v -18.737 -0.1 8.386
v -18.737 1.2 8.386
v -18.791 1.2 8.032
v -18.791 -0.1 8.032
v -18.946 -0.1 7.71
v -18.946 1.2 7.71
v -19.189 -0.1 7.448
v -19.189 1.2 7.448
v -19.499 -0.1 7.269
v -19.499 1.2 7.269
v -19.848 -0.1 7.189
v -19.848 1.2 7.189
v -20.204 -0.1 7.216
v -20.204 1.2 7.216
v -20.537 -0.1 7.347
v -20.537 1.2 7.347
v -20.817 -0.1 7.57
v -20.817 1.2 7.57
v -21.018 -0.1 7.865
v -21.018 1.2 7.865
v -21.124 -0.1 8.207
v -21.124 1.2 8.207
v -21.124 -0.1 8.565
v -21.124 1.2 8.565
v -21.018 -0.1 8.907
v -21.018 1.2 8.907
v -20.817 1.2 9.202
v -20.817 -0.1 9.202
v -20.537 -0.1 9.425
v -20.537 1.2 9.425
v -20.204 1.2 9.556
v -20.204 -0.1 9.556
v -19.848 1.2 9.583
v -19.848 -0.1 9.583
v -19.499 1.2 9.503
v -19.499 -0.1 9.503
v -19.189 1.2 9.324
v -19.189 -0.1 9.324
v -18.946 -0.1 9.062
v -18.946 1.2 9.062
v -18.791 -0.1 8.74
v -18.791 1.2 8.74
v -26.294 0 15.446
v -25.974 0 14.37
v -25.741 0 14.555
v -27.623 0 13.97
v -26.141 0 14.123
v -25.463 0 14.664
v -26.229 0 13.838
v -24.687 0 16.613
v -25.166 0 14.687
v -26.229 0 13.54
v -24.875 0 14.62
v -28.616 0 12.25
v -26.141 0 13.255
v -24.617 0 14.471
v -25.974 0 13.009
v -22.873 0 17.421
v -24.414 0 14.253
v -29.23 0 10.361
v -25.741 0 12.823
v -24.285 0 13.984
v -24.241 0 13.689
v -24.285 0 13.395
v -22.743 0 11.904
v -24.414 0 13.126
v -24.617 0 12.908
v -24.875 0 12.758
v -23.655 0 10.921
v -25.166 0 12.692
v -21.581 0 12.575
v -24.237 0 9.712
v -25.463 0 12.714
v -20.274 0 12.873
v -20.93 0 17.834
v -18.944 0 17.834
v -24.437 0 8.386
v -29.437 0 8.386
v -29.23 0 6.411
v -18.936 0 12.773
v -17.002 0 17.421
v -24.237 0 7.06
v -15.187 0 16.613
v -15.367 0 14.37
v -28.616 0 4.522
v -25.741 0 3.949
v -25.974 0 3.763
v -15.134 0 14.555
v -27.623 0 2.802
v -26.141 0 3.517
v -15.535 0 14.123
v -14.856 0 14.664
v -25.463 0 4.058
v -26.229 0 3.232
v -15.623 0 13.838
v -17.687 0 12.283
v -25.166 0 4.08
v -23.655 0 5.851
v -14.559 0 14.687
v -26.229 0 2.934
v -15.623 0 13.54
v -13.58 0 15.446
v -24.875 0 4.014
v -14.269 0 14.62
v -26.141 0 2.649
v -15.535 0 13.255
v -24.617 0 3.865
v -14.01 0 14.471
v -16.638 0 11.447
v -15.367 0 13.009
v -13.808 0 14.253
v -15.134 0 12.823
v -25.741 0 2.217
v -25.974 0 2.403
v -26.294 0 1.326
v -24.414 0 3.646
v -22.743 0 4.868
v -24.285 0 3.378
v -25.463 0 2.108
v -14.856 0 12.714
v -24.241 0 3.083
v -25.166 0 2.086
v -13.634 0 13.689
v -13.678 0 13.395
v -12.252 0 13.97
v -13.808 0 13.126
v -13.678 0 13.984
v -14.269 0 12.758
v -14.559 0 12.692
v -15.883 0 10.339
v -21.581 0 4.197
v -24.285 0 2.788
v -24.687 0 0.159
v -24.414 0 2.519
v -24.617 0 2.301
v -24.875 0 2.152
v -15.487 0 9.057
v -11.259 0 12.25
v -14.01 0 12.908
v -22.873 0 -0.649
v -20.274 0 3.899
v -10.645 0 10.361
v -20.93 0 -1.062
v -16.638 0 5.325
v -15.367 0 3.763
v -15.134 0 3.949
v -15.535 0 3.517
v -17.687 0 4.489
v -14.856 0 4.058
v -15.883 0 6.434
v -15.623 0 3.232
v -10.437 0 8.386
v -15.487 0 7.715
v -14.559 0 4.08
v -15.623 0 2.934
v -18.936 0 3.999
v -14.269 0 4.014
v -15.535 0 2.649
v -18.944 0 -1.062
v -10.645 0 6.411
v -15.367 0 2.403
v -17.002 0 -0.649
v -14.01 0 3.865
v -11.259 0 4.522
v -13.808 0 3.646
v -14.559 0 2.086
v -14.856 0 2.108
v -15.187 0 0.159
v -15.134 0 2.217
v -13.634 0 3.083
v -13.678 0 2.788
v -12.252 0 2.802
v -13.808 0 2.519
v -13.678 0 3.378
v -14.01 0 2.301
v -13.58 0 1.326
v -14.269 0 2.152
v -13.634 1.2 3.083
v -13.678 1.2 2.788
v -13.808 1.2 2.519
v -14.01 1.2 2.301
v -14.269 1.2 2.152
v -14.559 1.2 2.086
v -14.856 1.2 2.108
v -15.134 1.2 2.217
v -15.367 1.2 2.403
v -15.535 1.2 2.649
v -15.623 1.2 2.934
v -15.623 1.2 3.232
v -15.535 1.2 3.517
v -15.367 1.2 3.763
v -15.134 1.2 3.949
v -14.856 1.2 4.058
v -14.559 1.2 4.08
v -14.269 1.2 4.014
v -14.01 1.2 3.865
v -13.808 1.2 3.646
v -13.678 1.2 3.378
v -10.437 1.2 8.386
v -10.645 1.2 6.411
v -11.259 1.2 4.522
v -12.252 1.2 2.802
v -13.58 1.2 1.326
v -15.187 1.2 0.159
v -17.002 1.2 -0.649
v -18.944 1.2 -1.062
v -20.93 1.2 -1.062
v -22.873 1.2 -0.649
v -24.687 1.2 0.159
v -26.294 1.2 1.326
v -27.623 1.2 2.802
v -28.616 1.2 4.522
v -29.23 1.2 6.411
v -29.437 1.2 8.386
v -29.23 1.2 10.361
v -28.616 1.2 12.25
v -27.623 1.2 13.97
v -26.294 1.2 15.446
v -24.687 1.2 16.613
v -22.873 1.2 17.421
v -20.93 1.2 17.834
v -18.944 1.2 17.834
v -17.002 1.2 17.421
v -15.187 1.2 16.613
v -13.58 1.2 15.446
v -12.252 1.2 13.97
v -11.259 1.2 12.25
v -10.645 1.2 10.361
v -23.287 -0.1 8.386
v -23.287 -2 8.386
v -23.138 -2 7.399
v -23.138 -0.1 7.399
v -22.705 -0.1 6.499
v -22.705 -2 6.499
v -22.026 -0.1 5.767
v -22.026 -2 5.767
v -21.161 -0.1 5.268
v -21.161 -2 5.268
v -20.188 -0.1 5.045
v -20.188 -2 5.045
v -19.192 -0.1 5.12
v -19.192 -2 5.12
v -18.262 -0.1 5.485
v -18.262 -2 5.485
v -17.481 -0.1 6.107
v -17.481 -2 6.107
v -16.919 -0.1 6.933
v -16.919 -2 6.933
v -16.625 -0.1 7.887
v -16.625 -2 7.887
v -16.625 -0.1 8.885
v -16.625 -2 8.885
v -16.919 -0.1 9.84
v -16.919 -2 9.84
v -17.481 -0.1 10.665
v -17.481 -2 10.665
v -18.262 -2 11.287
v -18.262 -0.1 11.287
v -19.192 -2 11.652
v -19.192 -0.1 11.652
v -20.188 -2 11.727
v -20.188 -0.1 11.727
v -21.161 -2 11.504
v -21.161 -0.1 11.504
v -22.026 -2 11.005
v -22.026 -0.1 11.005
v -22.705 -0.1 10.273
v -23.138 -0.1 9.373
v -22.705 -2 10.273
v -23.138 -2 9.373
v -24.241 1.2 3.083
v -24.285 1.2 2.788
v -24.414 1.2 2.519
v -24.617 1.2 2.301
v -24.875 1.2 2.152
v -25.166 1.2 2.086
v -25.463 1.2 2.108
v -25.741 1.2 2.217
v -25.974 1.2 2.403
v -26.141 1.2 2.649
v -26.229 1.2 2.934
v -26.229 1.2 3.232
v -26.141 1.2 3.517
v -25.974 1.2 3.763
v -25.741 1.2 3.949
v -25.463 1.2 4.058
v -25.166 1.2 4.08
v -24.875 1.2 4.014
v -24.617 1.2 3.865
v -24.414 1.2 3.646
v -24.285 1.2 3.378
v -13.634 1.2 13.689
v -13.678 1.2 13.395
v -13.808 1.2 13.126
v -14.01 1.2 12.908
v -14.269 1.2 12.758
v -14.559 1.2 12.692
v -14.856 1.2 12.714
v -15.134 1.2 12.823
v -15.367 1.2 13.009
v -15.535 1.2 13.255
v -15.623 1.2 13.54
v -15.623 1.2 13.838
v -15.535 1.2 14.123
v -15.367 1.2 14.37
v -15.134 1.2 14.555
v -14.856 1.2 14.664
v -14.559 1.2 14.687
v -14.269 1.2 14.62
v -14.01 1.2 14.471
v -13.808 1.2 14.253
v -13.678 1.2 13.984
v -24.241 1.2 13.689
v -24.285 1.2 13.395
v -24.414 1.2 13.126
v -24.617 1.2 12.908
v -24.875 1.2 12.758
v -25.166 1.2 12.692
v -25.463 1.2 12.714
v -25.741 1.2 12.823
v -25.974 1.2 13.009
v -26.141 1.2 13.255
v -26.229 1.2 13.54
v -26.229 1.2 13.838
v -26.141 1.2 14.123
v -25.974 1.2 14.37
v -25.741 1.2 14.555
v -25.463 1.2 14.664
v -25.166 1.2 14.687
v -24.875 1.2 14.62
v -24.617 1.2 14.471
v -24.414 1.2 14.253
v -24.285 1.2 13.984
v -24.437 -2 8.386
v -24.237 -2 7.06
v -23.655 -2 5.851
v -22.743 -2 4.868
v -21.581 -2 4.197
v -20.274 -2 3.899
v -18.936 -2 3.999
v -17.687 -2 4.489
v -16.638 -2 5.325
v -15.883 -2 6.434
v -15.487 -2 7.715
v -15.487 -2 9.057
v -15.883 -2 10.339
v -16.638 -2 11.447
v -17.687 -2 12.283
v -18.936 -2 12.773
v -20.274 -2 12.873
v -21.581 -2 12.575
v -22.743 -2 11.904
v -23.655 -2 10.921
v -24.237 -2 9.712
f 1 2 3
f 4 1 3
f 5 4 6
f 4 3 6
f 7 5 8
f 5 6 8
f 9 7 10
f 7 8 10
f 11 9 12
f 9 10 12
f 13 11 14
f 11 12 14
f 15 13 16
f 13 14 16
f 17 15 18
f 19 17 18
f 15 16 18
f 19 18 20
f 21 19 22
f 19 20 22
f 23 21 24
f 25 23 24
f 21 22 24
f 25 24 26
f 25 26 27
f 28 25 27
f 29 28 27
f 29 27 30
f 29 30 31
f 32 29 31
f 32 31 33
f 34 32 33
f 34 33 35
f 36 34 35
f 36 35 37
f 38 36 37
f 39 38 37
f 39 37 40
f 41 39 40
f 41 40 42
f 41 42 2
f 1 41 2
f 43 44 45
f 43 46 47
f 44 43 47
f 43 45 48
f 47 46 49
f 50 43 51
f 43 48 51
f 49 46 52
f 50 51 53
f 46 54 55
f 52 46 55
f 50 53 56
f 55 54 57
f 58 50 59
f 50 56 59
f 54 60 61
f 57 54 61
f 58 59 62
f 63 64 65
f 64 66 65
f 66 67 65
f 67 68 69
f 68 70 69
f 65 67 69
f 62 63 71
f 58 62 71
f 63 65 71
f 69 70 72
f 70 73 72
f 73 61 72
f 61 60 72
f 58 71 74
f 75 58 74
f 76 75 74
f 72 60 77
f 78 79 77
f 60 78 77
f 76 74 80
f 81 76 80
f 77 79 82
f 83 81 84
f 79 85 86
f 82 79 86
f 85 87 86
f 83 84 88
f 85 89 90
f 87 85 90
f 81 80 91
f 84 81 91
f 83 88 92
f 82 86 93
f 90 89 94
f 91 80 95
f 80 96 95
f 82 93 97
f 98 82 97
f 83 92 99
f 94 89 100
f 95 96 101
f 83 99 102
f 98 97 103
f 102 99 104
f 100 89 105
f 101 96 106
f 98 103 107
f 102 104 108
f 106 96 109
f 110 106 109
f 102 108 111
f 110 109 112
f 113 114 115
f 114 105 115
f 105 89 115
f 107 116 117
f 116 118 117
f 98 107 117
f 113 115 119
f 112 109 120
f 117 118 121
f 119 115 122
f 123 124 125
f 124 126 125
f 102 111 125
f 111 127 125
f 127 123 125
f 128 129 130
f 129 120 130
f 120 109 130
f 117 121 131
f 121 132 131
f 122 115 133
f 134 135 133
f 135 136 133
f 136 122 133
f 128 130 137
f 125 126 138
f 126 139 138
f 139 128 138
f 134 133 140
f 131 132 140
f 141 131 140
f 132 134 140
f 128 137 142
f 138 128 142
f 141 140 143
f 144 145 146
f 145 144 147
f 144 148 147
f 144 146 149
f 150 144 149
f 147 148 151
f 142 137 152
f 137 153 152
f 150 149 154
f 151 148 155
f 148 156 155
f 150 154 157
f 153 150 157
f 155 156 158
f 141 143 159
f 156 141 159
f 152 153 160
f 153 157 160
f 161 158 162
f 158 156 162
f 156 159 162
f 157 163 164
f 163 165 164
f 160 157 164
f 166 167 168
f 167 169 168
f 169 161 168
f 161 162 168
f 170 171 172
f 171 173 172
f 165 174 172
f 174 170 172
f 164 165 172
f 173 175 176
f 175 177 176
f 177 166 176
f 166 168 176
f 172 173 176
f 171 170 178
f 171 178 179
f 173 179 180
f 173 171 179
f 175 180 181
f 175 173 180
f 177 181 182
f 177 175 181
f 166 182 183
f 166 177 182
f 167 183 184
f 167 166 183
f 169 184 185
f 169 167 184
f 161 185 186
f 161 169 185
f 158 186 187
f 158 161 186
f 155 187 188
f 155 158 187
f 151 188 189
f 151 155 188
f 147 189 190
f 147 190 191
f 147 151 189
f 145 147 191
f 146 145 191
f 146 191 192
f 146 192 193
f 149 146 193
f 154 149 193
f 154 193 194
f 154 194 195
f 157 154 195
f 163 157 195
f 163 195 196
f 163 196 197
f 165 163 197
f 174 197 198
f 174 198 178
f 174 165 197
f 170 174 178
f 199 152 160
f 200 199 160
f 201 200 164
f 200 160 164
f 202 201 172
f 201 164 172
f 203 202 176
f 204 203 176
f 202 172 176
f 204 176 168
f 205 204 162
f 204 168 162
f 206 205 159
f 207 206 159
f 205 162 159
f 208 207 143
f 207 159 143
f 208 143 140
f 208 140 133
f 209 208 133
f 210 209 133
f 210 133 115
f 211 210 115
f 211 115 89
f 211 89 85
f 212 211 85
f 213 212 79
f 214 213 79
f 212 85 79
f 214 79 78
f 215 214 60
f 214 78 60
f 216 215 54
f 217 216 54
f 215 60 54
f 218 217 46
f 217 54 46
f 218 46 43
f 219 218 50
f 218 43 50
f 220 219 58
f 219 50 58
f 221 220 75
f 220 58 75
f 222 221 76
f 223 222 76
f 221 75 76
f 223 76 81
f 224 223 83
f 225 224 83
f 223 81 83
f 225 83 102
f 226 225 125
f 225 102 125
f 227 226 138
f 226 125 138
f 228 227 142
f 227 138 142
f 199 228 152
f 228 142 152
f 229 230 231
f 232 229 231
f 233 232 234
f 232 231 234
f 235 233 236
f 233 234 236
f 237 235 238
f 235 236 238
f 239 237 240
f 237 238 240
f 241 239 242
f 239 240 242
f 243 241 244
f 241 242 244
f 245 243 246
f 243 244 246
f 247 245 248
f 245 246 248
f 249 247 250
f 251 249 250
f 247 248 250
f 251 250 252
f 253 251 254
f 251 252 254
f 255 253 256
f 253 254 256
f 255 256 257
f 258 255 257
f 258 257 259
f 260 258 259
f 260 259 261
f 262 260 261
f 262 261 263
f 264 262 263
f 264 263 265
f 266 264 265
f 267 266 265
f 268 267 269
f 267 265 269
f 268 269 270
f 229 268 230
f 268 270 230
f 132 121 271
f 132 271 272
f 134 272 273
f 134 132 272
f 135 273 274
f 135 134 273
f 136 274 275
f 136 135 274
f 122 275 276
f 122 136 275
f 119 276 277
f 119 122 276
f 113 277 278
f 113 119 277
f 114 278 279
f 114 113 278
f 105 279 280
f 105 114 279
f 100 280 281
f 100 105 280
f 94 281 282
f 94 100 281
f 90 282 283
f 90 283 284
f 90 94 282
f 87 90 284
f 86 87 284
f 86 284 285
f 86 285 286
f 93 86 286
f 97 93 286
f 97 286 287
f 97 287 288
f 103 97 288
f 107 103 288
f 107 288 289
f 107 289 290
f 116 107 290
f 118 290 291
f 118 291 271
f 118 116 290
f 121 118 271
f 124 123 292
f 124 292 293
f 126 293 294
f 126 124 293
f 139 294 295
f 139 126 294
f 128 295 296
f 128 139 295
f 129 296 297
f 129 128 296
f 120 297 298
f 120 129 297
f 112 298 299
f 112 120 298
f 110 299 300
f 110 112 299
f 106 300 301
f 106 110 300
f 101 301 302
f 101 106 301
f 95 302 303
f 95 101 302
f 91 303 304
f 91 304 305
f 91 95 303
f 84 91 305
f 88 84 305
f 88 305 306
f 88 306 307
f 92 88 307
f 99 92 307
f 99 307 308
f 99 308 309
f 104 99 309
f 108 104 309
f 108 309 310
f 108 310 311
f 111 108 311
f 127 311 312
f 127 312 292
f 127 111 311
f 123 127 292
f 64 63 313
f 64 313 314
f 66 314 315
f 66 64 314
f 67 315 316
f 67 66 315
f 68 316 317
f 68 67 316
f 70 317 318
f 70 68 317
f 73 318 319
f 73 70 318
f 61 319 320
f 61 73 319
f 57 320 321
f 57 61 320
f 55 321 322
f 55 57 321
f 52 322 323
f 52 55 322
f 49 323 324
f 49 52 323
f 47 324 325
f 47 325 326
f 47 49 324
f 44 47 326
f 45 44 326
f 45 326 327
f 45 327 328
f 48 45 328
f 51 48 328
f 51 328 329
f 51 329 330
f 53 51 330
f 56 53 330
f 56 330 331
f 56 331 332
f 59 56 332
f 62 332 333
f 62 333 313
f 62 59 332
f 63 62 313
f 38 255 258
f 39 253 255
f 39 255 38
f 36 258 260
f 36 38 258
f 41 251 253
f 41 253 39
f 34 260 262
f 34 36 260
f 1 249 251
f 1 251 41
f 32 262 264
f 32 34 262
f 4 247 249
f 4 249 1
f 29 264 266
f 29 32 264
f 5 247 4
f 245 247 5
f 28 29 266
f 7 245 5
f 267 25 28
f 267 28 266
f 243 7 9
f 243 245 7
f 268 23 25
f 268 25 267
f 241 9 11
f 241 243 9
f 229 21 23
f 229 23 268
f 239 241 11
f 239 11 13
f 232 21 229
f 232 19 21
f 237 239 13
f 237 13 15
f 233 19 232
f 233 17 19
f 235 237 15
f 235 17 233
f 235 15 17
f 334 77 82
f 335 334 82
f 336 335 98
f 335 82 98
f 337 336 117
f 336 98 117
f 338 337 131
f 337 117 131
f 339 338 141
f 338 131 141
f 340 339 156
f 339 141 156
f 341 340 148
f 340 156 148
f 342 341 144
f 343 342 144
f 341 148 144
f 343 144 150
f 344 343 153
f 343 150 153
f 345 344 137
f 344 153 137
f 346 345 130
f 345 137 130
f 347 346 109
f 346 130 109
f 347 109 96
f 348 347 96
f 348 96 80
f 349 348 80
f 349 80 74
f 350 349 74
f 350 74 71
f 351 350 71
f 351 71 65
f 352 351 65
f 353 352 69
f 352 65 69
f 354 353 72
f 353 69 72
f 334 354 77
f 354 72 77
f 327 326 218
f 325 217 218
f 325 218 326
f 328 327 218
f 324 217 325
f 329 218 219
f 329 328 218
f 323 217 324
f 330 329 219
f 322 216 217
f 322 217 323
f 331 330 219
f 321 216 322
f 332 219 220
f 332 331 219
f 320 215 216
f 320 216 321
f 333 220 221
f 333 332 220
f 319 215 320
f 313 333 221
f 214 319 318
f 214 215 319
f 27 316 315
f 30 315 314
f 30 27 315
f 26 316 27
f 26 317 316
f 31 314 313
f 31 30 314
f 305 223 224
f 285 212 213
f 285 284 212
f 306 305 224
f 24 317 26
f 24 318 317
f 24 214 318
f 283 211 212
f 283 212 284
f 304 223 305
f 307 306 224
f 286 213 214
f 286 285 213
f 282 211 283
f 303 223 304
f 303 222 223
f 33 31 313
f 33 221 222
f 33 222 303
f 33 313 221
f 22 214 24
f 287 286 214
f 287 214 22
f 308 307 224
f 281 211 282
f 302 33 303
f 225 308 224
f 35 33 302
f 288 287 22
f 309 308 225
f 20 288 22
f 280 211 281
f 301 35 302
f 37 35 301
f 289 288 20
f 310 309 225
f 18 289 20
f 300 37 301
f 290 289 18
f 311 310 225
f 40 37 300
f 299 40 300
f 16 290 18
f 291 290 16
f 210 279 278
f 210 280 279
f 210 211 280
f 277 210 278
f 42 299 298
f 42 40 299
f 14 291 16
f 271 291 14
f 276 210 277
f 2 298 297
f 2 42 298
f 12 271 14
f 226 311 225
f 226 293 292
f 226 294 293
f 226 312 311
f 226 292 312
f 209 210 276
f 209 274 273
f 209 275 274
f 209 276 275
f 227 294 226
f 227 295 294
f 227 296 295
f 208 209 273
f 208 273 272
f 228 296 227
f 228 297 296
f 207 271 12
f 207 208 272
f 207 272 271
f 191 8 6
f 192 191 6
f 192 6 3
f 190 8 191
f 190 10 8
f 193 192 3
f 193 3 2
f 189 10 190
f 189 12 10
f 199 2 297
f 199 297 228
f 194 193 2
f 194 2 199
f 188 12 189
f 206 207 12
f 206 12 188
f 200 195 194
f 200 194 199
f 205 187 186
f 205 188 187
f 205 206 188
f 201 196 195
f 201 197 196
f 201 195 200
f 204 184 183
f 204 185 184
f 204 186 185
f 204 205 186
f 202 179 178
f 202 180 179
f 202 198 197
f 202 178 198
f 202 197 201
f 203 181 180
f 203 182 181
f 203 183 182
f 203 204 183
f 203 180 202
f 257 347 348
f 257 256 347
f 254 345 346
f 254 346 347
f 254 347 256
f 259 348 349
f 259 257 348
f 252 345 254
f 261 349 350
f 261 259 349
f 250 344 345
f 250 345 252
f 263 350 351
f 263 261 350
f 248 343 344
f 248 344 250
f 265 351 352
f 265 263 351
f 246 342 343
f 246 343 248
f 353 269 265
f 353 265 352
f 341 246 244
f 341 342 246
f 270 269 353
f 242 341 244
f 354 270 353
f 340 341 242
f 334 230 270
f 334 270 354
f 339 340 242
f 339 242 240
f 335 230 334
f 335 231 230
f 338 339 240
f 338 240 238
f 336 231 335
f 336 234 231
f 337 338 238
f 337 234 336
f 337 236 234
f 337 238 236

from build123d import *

# Parameters (mm, degrees)
CROQUIS1_R              = 9.5
CROQUIS1_R_2            = 1
SALIENTE_EXTRUIR1_DEPTH = 1.2
CROQUIS2_R              = 4.5
SALIENTE_EXTRUIR2_DEPTH = 2
SKETCH1_R               = 1.2
CUT_EXTRUDE2_DEPTH      = 5
CROQUIS3_R              = 3.35
CUT_EXTRUDE3_DEPTH      = 1.9


with BuildPart() as part:
    # Croquis1 → Saliente-Extruir1 (new body)
    with BuildSketch(Plane(origin=(0, 0, 0), x_dir=(1, 0, 0), z_dir=(0, 1, 0))):
        with Locations((-19.93721465, -8.386058239)):
            Circle(CROQUIS1_R)
        with Locations((-14.633913791, -3.08275738)):
            Circle(CROQUIS1_R_2, mode=Mode.SUBTRACT)
        with Locations((-14.633913791, -13.689359098)):
            Circle(CROQUIS1_R_2, mode=Mode.SUBTRACT)
        with Locations((-25.240515509, -13.689359098)):
            Circle(CROQUIS1_R_2, mode=Mode.SUBTRACT)
        with Locations((-25.240515509, -3.08275738)):
            Circle(CROQUIS1_R_2, mode=Mode.SUBTRACT)
    extrude(amount=SALIENTE_EXTRUIR1_DEPTH)

    # Croquis2 → Saliente-Extruir2 (add)
    with BuildSketch(Plane(origin=(0, 0, 0), x_dir=(-1, 0, 0), z_dir=(0, -1, 0))):
        with Locations((19.93721465, -8.386058239)):
            Circle(CROQUIS2_R)
    extrude(amount=SALIENTE_EXTRUIR2_DEPTH)

    # Sketch1 → Cut-Extrude2 (cut)
    with BuildSketch(Plane(origin=(0, 1.2, 0), x_dir=(1, 0, 0), z_dir=(0, 1, 0))):
        with Locations((-19.93721465, -8.386058239)):
            Circle(SKETCH1_R)
    extrude(amount=-CUT_EXTRUDE2_DEPTH, mode=Mode.SUBTRACT)

    # Croquis3 → Cut-Extrude3 (cut)
    with BuildSketch(Plane(origin=(0, -2, 0), x_dir=(-1, 0, 0), z_dir=(0, -1, 0))):
        with Locations((19.93721465, -8.386058239)):
            Circle(CROQUIS3_R)
    extrude(amount=-CUT_EXTRUDE3_DEPTH, mode=Mode.SUBTRACT)


solid = part.part
